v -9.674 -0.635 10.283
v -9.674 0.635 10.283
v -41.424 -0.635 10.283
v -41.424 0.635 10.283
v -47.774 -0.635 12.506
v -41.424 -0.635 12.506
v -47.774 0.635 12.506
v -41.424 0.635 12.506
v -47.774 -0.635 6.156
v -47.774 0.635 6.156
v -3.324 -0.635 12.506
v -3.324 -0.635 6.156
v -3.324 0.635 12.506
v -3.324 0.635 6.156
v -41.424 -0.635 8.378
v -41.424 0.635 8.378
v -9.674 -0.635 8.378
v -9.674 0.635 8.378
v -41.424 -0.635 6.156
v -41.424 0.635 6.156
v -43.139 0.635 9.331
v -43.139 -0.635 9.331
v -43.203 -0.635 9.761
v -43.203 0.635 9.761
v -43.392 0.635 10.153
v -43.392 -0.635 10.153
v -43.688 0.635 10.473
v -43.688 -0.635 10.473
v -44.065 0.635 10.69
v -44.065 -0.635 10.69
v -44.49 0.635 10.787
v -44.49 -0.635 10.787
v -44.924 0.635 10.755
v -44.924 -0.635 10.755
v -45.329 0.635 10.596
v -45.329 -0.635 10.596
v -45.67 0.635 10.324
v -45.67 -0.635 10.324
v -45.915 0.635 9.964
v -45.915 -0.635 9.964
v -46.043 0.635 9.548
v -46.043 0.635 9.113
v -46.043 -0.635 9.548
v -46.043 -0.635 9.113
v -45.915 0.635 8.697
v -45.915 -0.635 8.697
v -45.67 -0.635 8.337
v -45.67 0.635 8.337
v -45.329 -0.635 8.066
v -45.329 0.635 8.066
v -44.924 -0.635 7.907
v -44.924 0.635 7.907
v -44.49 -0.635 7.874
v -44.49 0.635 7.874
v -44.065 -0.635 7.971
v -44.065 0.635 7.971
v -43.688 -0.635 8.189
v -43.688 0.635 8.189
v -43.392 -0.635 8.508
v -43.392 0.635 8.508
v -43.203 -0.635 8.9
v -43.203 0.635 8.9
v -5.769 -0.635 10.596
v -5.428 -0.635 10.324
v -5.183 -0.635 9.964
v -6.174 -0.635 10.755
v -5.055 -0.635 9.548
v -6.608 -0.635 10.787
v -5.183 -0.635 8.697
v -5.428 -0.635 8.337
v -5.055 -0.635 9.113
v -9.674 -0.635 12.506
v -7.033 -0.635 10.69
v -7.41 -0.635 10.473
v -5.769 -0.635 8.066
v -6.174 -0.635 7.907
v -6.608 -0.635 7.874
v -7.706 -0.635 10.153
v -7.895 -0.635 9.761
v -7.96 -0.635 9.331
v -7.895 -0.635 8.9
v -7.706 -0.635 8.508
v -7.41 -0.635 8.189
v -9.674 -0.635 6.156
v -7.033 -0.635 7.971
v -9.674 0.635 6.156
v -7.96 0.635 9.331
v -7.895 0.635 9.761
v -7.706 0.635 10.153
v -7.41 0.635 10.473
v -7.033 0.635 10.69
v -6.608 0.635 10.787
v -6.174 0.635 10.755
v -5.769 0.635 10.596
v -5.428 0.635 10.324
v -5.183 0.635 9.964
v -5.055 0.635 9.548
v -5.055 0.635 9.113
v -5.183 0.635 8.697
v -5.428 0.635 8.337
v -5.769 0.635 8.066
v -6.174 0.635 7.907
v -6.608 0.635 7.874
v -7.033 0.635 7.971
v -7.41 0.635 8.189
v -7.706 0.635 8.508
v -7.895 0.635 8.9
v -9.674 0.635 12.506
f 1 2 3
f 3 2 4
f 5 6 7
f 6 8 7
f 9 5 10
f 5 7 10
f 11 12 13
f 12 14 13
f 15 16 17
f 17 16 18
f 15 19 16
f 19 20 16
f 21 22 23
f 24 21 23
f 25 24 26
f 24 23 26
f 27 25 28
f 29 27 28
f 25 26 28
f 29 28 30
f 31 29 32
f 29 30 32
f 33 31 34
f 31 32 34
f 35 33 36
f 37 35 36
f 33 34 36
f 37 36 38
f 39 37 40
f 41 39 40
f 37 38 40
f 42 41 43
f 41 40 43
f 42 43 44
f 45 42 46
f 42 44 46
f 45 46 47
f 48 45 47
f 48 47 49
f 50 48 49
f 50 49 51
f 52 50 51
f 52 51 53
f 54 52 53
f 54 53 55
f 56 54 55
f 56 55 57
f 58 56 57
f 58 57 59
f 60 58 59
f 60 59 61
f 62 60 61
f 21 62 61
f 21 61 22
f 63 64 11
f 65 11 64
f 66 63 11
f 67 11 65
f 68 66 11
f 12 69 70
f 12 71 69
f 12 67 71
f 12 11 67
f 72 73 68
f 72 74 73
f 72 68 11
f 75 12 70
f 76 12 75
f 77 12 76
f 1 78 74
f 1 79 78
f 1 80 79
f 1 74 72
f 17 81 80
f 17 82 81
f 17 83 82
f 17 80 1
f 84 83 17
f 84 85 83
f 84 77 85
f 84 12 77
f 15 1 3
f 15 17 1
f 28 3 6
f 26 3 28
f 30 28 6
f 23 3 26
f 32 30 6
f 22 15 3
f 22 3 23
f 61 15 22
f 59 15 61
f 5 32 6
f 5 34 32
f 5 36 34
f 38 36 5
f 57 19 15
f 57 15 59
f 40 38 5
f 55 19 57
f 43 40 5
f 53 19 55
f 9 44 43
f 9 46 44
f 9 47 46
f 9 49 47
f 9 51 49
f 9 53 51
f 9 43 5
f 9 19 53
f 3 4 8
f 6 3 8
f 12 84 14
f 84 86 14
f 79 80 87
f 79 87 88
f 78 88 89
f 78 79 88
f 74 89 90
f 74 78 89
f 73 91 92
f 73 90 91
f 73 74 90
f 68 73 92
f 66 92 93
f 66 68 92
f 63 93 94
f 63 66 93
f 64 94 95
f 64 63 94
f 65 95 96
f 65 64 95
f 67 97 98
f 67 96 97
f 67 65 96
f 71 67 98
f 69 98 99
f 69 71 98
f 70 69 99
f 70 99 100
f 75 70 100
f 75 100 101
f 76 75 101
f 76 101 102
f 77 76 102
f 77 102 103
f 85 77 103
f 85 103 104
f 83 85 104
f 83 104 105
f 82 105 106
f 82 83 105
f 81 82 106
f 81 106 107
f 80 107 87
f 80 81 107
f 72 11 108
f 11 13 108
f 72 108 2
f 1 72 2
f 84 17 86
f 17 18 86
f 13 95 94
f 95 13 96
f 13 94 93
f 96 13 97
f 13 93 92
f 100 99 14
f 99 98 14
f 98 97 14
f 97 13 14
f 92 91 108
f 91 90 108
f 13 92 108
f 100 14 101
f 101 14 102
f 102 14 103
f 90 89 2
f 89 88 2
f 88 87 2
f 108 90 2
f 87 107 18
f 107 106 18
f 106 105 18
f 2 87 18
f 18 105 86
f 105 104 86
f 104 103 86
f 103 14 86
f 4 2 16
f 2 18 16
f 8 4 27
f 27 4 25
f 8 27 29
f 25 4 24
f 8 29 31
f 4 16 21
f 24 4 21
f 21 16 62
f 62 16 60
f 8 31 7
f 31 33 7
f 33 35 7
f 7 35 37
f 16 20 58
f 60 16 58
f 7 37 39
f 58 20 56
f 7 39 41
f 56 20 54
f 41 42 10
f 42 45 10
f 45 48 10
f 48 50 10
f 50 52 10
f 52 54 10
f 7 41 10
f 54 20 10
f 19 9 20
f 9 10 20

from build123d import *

# Parameters (mm, degrees)
BOSS_EXTRUDE1_DEPTH          = 0.635
F_97_0_0059_DIAMETER_HOLE1_D = 2.921


with BuildPart() as part:
    # Sketch1 → Boss-Extrude1 (new, symmetric)
    with BuildSketch(Plane(origin=(0, 0, 0), x_dir=(1, 0, 0), z_dir=(0, 1, 0))):
        Polygon((-41.424046485, -10.283259465), (-41.424046485, -12.505759465), (-47.774046485, -12.505759465), (-47.774046485, -6.155759465), (-41.424046485, -6.155759465), (-41.424046485, -8.378259465), (-9.674046485, -8.378259465), (-9.674046485, -6.155759465), (-3.324046485, -6.155759465), (-3.324046485, -12.505759465), (-9.674046485, -12.505759465), (-9.674046485, -10.283259465), align=None)
    extrude(amount=BOSS_EXTRUDE1_DEPTH, both=True)

    # #97 (0.0059) Diameter Hole1 (through all)
    with Locations(Plane(origin=(0, 0.635, 0), x_dir=(-1, 0, 0), z_dir=(0, 1, 0))):
        with Locations((44.599046485, 9.330759465)):
            f_97_0_0059_diameter_hole1 = Hole(F_97_0_0059_DIAMETER_HOLE1_D / 2)

    # Mirror1: #97 (0.0059) Diameter Hole1 across plane
    add(f_97_0_0059_diameter_hole1.mirror(Plane(origin=(-25.549046485, 0, 0), x_dir=(0, 0, 1), z_dir=(1, 0, 0))), mode=Mode.SUBTRACT)


solid = part.part
